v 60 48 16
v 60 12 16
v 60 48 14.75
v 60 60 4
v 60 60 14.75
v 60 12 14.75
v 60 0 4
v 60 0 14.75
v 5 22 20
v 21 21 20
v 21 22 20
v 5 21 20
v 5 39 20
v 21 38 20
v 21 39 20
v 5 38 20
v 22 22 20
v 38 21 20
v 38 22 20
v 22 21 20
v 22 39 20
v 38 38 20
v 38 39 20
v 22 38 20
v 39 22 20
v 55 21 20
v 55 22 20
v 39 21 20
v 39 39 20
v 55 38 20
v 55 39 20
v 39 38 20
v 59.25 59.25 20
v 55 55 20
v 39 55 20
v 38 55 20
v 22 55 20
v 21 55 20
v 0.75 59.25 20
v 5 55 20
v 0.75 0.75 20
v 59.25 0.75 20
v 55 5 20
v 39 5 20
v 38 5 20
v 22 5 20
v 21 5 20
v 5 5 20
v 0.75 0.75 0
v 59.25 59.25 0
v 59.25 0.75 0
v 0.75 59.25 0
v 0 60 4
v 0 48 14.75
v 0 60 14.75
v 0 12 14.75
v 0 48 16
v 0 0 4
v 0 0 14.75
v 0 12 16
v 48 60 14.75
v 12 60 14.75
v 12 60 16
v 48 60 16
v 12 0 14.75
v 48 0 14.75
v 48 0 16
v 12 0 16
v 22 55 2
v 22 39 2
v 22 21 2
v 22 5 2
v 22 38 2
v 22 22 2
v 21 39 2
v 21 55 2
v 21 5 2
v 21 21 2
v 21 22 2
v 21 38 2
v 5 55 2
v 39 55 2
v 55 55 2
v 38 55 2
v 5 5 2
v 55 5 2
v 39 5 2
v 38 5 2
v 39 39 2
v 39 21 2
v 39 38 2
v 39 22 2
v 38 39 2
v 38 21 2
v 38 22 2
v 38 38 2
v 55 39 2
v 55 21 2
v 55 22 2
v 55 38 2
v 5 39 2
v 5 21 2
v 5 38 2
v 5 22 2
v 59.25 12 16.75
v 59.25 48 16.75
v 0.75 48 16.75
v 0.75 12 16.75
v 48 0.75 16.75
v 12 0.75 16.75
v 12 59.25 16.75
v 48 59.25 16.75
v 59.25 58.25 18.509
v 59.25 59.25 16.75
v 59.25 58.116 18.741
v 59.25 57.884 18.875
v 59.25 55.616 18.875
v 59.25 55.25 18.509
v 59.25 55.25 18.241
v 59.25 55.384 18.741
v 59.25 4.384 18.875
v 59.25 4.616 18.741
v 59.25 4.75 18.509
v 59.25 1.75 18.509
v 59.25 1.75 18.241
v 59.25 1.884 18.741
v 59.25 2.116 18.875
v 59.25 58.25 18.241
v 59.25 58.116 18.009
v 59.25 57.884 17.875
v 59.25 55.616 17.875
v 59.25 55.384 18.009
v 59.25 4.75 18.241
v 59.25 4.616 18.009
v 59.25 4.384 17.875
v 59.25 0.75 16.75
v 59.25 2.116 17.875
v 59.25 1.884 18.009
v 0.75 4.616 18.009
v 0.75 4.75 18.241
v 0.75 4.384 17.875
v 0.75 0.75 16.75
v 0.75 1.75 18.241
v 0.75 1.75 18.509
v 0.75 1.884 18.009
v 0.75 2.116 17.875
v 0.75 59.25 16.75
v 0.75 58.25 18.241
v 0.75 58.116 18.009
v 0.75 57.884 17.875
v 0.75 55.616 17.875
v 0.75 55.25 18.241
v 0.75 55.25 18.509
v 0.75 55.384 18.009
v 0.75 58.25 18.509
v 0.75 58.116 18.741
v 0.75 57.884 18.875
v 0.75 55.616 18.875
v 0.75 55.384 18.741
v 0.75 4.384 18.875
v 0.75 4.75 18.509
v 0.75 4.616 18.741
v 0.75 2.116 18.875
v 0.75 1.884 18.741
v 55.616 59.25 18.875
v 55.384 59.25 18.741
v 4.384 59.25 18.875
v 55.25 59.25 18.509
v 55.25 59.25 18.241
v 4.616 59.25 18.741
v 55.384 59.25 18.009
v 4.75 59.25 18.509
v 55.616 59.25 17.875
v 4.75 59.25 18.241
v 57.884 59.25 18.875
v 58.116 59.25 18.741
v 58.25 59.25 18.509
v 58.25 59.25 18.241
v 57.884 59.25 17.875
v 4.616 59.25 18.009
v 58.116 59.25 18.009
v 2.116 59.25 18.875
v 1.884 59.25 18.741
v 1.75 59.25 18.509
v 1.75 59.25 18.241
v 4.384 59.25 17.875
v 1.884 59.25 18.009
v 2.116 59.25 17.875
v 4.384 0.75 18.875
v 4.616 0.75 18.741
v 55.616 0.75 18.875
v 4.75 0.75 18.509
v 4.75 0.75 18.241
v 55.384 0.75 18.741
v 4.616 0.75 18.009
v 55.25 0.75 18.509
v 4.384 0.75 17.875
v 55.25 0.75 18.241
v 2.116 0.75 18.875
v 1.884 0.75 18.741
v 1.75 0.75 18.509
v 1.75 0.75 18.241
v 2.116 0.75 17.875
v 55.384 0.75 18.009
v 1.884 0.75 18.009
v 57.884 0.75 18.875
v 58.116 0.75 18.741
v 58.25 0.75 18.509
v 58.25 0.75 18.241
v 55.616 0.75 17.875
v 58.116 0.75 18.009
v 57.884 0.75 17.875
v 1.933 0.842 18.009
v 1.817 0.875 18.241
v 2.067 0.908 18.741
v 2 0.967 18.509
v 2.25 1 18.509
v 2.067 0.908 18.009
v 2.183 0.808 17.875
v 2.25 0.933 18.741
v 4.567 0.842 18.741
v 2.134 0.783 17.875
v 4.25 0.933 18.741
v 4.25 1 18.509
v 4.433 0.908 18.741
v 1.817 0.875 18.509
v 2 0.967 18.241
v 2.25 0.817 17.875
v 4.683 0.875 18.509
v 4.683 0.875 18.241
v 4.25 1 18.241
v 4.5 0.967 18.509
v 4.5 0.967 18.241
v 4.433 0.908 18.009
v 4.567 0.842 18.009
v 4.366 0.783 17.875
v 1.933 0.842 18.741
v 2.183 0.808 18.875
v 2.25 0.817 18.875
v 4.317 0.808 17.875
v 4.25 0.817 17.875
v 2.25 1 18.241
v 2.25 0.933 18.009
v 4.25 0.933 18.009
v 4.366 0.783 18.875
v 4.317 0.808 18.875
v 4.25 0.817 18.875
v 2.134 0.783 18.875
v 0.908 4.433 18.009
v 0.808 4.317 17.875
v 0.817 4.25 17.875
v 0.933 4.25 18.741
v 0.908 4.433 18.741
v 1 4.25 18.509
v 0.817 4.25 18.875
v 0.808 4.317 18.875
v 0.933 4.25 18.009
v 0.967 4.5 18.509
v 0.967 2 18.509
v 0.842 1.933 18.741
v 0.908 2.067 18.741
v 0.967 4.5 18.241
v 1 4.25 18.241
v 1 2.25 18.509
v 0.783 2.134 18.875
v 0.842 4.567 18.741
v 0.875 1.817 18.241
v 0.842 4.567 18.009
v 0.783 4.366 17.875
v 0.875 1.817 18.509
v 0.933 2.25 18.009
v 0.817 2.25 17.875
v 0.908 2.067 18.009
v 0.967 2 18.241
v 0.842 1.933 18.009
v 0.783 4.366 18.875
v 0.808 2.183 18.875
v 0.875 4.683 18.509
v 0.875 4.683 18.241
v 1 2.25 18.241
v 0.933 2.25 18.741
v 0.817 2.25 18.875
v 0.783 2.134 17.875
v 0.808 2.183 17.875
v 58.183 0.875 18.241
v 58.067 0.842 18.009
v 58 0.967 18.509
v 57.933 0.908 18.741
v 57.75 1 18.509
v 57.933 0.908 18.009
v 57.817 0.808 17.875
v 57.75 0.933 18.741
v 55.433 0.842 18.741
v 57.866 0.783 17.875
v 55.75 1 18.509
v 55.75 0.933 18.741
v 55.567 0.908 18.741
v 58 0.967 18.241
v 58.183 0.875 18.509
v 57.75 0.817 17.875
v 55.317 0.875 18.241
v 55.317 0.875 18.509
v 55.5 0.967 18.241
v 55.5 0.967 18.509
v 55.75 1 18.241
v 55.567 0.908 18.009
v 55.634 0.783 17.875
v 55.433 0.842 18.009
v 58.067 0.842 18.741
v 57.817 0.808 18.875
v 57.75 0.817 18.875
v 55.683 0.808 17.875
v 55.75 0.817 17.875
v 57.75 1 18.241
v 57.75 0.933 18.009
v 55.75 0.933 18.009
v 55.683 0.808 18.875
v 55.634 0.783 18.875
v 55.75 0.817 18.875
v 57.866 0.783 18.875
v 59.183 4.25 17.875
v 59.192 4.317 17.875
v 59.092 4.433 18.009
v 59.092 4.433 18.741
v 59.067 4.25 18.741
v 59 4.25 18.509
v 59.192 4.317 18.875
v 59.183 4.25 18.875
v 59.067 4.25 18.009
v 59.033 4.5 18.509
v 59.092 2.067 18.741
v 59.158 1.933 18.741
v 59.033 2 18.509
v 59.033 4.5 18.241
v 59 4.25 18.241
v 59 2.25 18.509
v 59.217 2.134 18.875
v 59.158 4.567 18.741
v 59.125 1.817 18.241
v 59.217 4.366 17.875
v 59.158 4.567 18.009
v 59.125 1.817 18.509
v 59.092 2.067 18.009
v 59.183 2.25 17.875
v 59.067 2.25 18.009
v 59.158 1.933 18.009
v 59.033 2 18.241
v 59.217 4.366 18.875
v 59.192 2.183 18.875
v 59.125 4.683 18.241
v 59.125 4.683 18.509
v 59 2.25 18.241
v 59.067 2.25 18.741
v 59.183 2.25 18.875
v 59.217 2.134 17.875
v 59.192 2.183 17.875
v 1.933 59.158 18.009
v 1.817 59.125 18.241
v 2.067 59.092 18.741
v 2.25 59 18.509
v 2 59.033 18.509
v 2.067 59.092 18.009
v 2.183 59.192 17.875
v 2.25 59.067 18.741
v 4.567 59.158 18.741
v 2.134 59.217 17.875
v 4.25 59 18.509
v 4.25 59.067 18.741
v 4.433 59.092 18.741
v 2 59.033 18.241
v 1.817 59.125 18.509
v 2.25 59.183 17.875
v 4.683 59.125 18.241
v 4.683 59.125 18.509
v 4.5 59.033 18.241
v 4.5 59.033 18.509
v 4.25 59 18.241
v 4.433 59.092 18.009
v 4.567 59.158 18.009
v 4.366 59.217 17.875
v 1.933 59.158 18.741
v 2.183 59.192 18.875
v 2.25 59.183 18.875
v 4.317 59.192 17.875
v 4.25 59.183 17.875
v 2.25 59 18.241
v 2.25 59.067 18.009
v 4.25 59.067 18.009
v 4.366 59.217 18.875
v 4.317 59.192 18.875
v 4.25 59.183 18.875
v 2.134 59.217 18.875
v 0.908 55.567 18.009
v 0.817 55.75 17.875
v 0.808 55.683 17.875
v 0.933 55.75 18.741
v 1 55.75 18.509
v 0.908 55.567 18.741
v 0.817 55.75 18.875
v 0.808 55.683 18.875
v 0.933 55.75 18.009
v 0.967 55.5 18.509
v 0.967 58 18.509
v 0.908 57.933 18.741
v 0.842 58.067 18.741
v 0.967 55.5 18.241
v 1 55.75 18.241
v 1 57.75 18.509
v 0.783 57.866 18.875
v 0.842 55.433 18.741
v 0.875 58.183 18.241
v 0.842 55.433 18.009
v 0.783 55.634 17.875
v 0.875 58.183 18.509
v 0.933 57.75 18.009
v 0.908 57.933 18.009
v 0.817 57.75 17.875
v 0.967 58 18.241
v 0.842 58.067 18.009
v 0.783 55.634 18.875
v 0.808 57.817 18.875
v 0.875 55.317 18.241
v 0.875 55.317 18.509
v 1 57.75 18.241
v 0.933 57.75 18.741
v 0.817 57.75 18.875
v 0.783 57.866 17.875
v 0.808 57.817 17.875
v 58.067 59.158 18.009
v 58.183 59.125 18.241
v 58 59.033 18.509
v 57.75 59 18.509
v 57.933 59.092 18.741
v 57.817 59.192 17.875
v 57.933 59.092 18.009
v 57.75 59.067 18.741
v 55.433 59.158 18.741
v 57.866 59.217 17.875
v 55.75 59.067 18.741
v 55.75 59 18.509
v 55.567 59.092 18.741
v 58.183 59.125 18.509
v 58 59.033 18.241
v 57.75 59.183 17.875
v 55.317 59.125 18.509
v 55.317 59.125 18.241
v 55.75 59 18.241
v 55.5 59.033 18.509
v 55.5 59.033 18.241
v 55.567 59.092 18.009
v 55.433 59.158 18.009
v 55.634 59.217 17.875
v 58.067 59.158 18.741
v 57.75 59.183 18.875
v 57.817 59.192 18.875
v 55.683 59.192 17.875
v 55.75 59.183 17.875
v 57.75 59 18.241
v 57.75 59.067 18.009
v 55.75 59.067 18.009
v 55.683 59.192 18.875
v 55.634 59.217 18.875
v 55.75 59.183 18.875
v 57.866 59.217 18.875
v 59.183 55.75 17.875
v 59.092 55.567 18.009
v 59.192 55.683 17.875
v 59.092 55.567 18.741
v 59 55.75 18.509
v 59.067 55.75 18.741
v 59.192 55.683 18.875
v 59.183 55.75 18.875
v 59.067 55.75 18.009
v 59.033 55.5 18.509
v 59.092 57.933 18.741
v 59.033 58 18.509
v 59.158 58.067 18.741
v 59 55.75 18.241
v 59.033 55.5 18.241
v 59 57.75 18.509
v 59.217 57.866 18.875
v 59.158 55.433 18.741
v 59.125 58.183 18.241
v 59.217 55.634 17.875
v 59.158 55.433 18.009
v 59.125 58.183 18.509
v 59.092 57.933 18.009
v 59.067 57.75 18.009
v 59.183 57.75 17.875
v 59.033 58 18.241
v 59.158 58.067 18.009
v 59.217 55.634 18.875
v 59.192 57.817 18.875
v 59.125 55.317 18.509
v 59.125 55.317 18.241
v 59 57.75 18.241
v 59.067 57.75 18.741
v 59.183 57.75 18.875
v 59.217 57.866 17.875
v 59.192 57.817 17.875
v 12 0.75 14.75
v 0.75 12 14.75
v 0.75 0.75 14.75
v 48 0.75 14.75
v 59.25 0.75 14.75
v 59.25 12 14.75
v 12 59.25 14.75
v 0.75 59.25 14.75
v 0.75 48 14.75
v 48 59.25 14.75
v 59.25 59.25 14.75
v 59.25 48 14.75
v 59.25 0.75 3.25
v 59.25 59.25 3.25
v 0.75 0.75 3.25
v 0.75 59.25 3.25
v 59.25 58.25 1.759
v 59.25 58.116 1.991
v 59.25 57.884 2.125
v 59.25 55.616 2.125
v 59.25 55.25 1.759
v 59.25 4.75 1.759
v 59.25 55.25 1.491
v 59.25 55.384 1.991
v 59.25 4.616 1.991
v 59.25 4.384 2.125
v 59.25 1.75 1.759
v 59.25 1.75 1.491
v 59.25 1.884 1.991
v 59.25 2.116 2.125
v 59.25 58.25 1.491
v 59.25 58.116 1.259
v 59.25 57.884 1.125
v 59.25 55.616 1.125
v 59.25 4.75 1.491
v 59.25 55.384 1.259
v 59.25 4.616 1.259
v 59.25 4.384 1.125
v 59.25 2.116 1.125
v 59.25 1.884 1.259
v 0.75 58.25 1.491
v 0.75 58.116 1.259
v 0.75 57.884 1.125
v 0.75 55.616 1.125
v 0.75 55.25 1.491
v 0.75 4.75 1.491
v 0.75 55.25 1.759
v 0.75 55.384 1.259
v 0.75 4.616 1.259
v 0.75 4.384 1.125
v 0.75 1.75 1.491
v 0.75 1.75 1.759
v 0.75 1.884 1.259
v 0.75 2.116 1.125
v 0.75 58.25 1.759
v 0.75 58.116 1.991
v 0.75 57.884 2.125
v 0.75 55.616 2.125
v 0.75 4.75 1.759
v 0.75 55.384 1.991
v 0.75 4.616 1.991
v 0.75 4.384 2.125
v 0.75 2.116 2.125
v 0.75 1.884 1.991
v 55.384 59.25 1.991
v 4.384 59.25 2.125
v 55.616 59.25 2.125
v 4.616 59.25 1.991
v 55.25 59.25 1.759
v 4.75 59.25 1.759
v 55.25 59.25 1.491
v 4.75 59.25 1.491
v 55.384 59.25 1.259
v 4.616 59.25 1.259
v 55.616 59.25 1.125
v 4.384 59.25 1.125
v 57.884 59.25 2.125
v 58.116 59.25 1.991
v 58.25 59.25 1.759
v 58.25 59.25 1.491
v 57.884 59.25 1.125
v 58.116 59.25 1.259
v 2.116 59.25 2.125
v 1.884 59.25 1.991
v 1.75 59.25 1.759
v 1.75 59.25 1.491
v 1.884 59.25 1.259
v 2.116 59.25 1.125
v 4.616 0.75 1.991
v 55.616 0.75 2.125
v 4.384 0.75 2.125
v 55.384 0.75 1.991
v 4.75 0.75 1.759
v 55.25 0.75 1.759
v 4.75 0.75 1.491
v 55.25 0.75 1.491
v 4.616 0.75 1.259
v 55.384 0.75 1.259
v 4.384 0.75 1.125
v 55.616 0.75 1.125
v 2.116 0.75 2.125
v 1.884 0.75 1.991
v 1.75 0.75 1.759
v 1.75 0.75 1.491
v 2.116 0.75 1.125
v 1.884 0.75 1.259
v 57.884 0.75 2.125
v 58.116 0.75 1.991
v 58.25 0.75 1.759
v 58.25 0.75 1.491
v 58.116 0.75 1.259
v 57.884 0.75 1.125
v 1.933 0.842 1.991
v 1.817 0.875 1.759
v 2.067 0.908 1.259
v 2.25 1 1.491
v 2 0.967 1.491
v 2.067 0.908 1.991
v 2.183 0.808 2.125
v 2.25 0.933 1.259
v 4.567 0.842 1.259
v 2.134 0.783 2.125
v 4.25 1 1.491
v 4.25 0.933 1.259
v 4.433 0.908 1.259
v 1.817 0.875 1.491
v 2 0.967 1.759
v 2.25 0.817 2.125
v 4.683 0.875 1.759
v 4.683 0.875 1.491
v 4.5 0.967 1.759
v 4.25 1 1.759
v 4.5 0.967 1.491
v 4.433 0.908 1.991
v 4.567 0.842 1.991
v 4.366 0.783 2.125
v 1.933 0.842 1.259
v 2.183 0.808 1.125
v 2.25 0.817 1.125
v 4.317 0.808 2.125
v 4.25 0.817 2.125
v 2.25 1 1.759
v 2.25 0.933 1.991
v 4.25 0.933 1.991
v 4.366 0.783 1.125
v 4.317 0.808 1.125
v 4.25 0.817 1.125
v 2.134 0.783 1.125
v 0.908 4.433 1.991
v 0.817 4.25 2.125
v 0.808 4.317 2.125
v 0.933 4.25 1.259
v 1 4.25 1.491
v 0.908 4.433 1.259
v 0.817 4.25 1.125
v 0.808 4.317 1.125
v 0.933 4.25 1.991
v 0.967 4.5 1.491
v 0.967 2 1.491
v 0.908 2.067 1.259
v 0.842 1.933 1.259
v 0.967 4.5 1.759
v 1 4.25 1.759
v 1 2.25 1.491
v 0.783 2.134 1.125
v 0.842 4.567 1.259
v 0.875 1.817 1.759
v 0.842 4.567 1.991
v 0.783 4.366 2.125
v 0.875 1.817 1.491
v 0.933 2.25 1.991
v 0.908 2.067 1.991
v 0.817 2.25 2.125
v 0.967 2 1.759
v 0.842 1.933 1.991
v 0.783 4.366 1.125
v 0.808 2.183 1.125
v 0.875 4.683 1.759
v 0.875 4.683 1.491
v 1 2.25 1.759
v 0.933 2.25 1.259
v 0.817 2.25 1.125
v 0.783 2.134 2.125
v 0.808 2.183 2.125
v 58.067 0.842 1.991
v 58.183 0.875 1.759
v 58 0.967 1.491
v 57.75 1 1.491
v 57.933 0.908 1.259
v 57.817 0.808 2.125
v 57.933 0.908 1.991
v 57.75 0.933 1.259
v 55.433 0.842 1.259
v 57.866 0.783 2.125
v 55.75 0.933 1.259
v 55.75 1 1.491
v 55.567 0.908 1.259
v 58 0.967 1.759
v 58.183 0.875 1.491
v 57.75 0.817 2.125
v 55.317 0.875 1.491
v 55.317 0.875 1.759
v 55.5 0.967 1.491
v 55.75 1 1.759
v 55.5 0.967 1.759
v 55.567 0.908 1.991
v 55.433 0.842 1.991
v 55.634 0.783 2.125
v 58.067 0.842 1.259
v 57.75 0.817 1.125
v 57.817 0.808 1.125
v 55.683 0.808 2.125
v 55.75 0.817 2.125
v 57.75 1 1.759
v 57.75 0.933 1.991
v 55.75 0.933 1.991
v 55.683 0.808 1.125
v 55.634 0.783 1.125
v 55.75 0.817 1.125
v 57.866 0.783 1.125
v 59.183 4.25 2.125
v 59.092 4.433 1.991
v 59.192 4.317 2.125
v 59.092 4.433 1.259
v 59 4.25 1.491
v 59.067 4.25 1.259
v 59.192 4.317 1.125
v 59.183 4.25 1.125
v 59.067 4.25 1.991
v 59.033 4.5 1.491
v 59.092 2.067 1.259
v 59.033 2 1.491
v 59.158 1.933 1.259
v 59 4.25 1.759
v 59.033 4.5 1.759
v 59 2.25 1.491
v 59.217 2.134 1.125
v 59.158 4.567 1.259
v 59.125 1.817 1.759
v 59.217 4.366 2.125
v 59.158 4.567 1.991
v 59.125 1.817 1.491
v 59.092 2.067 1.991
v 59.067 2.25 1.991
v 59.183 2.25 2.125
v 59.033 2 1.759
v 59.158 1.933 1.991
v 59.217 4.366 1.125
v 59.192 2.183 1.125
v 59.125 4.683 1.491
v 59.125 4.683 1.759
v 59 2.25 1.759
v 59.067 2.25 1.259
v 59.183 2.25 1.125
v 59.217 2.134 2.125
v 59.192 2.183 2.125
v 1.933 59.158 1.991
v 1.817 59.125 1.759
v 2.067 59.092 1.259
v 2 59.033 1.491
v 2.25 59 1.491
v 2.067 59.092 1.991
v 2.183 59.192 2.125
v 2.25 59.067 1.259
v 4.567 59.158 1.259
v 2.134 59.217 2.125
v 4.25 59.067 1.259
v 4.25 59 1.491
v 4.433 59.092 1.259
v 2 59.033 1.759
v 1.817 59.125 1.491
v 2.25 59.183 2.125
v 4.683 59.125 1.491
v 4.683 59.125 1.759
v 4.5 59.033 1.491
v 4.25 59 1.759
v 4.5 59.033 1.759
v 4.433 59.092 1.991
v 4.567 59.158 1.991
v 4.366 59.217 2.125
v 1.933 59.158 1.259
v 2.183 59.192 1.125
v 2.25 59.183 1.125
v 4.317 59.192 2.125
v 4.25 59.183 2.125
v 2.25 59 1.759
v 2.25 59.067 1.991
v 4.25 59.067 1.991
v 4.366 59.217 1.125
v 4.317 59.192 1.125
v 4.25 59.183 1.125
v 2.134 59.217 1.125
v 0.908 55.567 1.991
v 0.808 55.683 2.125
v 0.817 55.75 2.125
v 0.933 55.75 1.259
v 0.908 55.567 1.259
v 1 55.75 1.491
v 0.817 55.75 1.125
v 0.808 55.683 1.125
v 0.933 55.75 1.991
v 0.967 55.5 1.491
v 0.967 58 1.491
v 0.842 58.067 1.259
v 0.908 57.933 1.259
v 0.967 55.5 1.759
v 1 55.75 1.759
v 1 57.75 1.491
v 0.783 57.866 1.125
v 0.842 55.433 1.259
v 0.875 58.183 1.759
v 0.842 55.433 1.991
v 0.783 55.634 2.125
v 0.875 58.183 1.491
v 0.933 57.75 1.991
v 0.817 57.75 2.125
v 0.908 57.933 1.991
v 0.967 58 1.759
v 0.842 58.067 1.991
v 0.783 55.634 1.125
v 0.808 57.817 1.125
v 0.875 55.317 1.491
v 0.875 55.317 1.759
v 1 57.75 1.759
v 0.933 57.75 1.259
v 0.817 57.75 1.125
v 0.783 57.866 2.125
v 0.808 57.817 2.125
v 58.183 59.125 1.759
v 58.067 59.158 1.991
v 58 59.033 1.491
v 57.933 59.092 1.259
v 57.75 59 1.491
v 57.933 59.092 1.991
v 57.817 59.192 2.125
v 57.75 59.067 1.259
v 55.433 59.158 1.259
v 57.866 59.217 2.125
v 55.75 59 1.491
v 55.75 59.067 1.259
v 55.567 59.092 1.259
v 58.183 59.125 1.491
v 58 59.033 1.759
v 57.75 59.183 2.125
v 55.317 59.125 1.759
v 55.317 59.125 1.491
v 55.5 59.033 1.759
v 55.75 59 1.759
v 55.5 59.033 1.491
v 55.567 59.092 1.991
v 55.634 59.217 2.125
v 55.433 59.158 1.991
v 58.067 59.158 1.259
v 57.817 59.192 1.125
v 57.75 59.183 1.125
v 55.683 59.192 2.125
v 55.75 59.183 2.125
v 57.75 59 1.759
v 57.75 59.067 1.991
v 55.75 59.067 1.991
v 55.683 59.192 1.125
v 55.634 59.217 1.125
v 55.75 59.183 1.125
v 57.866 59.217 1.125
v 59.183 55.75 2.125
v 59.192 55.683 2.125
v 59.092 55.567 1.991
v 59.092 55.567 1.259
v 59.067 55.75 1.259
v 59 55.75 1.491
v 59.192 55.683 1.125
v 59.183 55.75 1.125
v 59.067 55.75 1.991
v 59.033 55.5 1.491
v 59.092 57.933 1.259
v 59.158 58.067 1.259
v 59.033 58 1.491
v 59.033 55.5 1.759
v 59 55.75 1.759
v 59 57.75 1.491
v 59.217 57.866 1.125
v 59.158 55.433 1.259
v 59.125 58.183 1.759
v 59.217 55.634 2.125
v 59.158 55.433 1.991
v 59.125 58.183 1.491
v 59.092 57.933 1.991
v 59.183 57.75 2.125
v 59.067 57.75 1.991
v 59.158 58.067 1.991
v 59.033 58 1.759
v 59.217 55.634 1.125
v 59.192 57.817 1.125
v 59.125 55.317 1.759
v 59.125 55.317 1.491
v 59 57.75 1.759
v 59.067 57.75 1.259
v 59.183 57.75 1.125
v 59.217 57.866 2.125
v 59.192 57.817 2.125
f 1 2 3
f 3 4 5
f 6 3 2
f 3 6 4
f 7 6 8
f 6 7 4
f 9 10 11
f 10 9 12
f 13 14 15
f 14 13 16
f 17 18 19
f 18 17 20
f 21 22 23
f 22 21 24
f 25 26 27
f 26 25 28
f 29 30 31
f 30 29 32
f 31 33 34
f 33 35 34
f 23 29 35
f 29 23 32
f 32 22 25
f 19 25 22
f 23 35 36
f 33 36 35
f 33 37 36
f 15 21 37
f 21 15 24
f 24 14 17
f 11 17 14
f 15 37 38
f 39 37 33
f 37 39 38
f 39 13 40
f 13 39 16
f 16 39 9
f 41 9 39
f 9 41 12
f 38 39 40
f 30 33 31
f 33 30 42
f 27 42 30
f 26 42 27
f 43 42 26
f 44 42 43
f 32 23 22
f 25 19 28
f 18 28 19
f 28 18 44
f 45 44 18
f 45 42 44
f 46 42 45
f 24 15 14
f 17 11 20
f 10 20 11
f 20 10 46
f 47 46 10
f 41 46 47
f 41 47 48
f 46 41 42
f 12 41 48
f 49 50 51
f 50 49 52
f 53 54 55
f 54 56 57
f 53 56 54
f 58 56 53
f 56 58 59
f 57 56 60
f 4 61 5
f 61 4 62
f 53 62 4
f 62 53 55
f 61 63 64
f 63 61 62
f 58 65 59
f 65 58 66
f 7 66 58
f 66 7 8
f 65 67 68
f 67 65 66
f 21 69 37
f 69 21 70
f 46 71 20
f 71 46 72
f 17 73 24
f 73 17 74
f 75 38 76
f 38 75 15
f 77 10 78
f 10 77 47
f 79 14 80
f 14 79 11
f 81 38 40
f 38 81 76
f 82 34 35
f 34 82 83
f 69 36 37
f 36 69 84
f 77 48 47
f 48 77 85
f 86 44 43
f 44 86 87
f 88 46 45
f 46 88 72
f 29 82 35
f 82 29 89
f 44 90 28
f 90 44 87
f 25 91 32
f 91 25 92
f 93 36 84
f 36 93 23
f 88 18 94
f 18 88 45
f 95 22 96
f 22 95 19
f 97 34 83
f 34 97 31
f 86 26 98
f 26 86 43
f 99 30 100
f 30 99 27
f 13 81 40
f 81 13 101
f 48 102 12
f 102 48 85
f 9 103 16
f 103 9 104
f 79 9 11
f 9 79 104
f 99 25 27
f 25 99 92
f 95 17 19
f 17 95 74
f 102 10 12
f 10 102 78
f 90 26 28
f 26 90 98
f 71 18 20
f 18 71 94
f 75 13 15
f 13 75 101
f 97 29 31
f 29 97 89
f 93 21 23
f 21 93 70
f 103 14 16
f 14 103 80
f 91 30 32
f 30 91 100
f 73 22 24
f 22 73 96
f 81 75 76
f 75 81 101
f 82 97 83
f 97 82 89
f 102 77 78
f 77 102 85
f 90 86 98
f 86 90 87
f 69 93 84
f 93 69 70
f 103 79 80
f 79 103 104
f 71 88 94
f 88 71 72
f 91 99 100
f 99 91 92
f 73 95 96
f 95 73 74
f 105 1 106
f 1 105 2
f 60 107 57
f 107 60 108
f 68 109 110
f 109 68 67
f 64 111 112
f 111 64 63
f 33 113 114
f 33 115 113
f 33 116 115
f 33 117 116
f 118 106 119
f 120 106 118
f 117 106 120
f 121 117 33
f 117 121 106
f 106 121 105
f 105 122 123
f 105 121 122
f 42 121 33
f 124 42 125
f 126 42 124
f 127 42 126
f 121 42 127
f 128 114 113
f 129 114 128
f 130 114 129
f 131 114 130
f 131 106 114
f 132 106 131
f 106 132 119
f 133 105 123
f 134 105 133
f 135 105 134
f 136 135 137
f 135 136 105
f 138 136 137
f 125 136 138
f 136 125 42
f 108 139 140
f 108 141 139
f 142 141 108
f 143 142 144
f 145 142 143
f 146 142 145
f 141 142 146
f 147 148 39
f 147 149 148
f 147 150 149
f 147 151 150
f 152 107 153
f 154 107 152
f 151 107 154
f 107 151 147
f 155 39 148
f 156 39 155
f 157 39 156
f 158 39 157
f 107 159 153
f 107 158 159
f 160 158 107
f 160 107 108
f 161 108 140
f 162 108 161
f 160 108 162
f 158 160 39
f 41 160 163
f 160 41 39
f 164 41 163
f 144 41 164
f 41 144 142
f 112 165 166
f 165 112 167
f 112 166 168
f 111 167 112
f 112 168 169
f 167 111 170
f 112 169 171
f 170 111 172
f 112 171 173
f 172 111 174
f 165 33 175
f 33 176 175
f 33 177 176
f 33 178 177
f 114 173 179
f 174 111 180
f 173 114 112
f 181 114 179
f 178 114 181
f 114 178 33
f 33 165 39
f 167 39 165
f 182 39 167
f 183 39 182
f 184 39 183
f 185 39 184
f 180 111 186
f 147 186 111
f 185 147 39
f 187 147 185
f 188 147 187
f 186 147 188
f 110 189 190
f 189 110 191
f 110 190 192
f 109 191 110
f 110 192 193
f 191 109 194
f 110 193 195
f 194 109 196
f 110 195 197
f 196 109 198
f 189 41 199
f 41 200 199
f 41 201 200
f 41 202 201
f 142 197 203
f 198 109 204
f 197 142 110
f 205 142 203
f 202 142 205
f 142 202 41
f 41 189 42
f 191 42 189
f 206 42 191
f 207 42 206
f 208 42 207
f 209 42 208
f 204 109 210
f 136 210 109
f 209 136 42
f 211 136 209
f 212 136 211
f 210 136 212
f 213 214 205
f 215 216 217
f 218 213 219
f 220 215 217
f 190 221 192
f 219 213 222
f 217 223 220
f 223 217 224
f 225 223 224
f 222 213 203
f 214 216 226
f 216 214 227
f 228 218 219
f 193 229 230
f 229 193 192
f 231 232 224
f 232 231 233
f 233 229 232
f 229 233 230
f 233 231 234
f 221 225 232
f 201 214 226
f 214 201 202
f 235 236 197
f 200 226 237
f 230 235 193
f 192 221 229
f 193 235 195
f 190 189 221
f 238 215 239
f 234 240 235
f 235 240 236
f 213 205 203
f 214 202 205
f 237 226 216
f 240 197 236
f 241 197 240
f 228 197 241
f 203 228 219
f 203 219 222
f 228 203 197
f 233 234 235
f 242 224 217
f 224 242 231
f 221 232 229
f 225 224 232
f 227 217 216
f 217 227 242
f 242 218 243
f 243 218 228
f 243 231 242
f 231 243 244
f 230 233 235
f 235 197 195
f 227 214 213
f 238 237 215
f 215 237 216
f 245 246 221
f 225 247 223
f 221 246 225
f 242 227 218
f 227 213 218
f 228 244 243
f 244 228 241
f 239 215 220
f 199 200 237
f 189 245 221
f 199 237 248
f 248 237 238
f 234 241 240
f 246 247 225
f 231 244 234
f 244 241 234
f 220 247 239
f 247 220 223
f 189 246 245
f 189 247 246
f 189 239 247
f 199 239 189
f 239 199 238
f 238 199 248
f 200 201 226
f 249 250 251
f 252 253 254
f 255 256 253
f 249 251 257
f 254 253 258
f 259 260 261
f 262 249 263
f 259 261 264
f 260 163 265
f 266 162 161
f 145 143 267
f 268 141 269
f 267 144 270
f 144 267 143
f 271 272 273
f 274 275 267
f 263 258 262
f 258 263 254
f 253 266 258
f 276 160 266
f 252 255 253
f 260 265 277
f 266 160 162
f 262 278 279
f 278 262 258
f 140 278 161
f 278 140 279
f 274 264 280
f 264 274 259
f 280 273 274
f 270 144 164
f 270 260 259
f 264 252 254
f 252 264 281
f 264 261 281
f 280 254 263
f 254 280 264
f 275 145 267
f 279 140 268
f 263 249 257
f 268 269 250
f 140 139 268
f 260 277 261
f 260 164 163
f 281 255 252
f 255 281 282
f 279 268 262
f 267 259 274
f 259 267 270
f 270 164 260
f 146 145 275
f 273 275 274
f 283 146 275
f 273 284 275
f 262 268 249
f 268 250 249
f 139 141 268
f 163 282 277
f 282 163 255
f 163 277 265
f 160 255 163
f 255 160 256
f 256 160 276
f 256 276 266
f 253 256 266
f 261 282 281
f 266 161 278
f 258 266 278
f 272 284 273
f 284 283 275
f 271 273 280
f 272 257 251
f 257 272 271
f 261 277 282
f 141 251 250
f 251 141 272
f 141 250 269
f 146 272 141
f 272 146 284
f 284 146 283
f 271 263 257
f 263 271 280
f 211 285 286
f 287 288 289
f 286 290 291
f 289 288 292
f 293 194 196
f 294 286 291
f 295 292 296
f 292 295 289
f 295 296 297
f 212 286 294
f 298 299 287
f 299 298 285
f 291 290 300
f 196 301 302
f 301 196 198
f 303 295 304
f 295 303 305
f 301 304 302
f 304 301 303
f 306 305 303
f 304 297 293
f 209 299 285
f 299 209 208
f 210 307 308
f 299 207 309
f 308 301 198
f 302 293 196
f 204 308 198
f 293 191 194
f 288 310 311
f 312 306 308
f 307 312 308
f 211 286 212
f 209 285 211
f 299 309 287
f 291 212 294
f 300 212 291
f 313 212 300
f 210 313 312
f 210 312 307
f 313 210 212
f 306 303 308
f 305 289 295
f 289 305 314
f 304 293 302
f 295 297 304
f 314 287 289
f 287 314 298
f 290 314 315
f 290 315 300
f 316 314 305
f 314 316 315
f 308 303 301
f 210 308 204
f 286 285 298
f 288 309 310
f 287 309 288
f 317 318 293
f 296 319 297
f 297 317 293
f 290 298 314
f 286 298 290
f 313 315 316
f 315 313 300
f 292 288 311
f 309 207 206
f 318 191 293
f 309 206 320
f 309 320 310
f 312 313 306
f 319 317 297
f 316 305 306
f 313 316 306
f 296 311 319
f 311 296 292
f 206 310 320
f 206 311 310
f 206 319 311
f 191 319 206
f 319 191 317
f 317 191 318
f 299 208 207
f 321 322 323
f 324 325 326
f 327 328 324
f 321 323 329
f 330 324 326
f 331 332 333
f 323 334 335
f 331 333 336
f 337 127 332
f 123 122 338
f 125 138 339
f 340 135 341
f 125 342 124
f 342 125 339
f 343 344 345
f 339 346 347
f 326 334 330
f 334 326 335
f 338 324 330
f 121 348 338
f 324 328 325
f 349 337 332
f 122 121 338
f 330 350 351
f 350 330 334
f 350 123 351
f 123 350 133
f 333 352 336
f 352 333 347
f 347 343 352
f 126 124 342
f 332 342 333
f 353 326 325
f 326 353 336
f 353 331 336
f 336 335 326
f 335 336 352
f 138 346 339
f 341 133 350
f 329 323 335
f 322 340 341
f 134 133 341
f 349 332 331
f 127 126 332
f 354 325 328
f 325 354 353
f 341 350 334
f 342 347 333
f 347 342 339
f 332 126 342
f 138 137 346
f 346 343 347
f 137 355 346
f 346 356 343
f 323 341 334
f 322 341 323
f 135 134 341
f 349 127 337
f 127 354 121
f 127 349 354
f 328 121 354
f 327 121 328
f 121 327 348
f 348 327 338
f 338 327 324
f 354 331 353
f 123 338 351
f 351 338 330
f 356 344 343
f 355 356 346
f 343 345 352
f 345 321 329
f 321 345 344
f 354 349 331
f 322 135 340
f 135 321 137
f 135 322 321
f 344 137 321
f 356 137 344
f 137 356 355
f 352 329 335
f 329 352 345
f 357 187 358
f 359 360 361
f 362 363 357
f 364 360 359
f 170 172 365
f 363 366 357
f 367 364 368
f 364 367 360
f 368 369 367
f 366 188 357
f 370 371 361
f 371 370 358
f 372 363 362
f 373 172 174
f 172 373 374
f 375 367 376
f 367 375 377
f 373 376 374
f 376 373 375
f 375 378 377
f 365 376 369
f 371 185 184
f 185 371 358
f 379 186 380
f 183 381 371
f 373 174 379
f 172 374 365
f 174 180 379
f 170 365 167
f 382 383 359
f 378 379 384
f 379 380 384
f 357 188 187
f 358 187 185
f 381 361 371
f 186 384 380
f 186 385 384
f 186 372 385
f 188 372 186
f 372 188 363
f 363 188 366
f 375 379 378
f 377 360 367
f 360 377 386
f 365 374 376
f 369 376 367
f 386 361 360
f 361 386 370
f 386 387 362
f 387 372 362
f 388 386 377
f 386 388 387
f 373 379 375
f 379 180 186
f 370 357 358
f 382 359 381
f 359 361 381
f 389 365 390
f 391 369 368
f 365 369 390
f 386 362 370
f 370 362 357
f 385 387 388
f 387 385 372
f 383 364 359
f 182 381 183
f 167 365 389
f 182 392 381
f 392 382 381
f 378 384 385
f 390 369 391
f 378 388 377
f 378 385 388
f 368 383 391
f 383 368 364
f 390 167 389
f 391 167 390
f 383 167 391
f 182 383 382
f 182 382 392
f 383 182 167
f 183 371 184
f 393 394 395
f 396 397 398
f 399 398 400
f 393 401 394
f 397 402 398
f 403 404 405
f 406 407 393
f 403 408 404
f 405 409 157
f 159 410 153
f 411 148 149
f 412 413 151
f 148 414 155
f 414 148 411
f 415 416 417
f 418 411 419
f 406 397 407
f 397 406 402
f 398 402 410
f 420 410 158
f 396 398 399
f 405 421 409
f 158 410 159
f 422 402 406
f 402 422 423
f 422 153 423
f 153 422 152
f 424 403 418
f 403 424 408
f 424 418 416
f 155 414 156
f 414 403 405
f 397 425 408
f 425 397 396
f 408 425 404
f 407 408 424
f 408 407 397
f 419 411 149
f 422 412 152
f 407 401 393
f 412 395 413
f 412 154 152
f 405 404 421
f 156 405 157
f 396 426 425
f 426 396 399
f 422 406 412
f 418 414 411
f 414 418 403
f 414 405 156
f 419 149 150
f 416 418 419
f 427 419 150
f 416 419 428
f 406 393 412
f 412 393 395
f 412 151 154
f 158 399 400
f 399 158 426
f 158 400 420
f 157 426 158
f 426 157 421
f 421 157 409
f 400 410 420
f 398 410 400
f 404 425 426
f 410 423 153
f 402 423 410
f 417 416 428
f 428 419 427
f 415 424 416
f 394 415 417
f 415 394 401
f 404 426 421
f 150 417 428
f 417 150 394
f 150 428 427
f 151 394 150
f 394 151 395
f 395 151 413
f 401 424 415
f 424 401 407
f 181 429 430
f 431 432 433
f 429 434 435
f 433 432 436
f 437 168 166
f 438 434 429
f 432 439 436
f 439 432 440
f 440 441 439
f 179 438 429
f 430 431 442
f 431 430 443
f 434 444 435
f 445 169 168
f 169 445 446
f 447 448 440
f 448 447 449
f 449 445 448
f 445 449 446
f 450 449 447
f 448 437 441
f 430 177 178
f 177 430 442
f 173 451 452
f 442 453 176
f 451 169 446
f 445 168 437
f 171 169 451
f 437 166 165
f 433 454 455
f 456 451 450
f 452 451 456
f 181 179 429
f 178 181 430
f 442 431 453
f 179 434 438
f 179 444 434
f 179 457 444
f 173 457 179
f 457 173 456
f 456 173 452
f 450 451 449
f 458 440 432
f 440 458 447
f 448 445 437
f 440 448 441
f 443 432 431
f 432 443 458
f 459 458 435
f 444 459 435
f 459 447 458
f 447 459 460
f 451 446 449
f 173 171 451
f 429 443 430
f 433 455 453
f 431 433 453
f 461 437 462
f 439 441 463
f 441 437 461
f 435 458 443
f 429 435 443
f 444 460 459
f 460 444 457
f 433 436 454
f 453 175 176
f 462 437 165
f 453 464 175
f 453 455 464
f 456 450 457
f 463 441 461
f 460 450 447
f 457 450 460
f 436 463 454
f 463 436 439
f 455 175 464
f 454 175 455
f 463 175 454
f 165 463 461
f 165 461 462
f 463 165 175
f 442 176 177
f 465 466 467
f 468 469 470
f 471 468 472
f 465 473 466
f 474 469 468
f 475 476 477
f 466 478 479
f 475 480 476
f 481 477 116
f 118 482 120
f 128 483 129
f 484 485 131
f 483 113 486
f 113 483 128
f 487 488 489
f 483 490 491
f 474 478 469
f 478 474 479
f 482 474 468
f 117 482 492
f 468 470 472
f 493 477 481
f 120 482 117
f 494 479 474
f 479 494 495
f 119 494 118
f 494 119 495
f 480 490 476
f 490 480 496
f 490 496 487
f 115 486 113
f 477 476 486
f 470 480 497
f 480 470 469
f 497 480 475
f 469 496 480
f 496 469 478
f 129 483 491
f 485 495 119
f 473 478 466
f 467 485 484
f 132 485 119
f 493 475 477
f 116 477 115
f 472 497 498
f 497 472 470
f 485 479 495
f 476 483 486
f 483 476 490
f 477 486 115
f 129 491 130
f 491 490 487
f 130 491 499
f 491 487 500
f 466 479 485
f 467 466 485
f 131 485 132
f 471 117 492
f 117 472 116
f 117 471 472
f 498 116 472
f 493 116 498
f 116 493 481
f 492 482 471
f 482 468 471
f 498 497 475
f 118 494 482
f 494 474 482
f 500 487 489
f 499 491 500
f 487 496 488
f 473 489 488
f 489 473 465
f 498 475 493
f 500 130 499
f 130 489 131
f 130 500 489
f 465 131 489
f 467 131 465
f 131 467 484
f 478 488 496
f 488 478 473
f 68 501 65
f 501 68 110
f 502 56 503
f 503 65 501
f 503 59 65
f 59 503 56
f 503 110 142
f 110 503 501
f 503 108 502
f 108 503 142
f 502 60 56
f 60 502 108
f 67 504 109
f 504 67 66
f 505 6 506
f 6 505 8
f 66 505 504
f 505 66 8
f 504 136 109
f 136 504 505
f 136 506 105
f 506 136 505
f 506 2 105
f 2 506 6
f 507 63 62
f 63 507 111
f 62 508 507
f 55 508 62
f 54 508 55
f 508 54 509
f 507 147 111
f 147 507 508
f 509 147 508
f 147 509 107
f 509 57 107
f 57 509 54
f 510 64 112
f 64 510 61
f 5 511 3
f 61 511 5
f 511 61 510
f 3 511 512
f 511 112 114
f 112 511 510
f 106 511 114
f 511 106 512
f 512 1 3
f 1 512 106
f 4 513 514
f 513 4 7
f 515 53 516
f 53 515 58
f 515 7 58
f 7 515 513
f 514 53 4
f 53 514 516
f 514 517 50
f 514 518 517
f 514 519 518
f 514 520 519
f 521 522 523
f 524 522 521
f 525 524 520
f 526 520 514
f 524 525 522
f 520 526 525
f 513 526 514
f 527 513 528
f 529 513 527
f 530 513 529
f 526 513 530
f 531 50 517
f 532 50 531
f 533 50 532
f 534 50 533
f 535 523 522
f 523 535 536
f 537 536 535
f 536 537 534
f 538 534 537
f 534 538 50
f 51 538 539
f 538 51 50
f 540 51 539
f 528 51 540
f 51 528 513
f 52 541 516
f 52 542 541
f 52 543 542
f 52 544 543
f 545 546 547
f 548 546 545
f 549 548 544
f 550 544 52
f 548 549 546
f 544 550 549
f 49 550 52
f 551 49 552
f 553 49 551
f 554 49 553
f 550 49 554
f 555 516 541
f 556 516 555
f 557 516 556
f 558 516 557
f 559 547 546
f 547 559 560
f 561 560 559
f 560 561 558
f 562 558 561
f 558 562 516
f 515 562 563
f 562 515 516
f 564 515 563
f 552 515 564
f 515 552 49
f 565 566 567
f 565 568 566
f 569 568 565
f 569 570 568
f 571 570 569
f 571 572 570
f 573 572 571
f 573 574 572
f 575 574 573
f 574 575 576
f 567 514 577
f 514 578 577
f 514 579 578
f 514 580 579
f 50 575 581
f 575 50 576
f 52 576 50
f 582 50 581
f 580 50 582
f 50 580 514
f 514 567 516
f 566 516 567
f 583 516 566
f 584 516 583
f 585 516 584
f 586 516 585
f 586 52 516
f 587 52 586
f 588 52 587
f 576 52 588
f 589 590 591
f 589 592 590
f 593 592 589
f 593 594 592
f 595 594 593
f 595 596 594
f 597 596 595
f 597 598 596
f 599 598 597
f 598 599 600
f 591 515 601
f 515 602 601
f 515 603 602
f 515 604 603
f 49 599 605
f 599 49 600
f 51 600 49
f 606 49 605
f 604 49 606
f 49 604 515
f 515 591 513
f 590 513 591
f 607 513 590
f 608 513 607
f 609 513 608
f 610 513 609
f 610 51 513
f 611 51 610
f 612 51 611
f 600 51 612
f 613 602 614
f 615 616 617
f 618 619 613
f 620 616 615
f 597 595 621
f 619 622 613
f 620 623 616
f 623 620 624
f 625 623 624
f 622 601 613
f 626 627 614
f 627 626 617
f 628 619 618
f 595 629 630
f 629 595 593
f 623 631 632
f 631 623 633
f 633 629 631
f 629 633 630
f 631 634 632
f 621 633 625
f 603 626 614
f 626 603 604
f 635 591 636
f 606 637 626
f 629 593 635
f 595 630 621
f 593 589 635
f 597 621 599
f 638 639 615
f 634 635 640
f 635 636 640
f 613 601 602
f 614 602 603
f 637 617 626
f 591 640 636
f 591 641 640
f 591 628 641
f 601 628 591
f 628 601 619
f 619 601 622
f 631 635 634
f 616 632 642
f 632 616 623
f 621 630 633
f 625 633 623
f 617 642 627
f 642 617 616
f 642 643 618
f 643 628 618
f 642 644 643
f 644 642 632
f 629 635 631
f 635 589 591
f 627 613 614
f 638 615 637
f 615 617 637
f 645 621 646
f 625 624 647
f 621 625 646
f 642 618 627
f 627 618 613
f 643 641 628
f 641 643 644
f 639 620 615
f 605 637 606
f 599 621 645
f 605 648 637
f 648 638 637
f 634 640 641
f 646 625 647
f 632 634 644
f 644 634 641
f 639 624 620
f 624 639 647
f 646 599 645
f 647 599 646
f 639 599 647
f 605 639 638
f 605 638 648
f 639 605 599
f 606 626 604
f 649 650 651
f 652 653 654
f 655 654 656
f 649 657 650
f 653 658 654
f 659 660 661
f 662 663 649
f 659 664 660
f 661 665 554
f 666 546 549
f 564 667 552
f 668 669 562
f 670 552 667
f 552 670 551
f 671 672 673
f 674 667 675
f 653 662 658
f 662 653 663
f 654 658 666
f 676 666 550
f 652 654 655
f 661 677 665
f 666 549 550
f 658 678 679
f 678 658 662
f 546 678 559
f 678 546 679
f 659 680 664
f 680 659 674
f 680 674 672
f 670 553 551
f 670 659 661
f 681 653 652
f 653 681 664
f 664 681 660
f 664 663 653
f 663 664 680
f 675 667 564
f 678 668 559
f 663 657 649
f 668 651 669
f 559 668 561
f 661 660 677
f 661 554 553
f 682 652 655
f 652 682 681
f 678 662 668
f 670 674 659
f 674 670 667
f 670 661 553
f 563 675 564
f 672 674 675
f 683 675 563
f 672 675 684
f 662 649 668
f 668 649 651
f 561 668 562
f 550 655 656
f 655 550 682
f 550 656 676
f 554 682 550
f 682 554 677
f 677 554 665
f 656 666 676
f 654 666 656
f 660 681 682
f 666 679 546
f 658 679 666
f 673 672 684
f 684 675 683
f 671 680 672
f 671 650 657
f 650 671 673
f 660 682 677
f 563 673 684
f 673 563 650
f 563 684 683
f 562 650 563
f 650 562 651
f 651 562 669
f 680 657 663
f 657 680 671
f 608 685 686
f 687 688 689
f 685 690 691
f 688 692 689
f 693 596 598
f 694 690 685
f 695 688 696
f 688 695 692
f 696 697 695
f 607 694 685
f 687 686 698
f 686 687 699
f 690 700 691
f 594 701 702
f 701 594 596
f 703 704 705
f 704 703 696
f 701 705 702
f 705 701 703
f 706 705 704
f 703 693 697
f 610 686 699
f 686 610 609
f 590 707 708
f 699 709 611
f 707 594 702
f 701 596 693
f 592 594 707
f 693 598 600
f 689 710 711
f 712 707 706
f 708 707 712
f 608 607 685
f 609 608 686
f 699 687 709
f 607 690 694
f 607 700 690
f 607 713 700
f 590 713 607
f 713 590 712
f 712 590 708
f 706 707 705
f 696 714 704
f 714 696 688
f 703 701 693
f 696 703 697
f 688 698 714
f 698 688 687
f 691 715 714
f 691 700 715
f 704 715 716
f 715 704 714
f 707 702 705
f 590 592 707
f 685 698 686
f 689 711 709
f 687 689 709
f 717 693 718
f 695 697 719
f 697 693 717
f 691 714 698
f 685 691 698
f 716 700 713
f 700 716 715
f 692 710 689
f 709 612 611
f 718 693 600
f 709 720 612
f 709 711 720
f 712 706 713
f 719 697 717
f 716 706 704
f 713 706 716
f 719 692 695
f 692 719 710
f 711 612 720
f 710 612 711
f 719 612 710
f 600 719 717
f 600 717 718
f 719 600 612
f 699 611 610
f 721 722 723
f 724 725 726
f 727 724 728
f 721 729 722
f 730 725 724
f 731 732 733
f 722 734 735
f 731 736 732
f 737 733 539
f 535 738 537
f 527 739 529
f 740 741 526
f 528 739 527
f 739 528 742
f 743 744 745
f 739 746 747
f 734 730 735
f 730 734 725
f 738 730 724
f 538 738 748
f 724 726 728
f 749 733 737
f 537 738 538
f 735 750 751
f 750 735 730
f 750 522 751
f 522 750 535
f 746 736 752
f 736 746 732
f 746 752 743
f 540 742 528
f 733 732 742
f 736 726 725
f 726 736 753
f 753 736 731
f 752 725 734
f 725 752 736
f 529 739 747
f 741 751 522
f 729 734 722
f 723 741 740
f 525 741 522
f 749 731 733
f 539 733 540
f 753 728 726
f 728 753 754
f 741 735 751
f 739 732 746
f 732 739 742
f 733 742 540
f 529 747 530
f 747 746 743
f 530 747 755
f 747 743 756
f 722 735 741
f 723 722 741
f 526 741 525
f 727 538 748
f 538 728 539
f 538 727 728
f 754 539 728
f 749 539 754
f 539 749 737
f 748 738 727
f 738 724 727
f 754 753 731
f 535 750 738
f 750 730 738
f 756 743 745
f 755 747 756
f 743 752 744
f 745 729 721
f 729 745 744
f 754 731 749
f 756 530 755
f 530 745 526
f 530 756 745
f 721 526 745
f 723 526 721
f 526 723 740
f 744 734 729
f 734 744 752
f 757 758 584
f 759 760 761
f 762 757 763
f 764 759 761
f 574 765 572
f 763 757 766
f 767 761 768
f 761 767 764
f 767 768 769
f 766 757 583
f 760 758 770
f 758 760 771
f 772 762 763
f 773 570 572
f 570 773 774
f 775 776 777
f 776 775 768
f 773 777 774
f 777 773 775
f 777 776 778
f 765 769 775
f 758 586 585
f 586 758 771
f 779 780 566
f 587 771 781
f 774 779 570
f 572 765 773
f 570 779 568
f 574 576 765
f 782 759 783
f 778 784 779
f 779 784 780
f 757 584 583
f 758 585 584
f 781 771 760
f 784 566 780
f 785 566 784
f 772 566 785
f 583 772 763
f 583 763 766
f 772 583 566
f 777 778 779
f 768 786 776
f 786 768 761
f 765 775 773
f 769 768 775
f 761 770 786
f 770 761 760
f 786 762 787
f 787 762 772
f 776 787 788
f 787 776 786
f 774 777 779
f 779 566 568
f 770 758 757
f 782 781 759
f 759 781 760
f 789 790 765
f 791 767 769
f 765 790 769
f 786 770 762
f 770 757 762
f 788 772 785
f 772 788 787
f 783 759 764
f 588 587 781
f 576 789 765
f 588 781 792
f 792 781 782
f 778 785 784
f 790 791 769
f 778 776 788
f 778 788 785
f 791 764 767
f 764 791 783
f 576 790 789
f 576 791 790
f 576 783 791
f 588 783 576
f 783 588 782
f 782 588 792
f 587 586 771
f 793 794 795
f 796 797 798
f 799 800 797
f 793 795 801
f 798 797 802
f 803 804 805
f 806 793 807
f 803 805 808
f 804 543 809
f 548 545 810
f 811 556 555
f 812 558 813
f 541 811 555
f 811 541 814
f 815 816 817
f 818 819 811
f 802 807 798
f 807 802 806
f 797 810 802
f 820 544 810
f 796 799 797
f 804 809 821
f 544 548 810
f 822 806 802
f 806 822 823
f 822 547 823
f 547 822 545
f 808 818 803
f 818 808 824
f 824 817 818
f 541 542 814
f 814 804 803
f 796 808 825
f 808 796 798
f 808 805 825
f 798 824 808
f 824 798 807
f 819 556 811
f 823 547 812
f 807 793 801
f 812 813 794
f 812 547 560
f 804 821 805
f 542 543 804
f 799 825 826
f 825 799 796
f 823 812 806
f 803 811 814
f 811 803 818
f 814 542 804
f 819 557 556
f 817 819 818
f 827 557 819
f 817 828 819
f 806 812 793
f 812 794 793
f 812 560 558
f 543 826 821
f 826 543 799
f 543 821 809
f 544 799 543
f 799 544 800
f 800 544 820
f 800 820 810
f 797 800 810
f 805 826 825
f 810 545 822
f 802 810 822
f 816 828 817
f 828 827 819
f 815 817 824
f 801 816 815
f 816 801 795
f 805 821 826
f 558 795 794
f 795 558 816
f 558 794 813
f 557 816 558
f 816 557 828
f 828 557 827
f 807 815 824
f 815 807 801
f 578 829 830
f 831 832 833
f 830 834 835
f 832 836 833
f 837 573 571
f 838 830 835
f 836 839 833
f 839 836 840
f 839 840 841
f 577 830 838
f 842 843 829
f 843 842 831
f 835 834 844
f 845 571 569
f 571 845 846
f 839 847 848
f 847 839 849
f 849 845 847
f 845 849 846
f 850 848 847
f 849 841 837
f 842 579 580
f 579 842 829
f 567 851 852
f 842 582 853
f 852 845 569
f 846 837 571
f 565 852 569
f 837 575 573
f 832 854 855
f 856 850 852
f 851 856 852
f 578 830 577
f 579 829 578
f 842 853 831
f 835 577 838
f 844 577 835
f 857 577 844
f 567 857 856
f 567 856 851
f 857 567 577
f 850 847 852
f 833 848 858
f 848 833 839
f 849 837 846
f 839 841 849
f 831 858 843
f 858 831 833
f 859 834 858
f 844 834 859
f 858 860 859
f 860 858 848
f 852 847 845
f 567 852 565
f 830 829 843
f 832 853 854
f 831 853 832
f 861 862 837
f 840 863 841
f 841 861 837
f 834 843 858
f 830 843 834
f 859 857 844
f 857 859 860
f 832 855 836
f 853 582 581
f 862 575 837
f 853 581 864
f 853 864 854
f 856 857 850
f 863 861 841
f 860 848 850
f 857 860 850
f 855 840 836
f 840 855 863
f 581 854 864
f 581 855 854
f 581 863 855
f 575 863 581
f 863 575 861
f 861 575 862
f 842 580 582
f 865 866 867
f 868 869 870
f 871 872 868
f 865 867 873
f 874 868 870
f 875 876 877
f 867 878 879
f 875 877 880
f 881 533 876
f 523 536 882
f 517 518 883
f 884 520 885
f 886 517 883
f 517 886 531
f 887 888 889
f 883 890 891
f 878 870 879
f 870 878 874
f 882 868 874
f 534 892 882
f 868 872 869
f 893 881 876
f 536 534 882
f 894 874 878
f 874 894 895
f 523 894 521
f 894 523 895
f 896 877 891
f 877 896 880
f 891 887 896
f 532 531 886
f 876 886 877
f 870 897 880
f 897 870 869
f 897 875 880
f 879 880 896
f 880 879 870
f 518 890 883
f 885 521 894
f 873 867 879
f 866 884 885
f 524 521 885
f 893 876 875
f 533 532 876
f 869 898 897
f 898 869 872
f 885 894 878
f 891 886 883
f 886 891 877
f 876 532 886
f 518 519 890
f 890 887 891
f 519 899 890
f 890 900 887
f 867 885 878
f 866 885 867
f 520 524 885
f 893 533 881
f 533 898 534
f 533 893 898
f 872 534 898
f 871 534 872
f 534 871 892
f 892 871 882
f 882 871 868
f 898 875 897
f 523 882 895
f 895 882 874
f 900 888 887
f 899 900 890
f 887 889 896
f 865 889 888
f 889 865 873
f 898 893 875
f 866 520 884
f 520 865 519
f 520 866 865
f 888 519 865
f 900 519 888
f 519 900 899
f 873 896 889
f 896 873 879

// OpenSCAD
// Test: g_isolated_print_box — only render the named box
include <../boardgame_insert_toolkit_lib.4.scad>;

g_b_print_lid = false;
g_b_print_box = true;
g_isolated_print_box = "target box";

data = [
    [ "hidden box",
        [
            [ BOX_SIZE_XYZ, [40, 40, 15] ],
            [ BOX_COMPONENT,
                [
                    [ CMP_COMPARTMENT_SIZE_XYZ, [36, 36, 13] ],
                ]
            ]
        ]
    ],
    [ "target box",
        [
            [ BOX_SIZE_XYZ, [60, 60, 20] ],
            [ BOX_COMPONENT,
                [
                    [ CMP_NUM_COMPARTMENTS_XY, [3, 3] ],
                    [ CMP_COMPARTMENT_SIZE_XYZ, [16, 16, 18] ],
                ]
            ]
        ]
    ],
];

MakeAll();
